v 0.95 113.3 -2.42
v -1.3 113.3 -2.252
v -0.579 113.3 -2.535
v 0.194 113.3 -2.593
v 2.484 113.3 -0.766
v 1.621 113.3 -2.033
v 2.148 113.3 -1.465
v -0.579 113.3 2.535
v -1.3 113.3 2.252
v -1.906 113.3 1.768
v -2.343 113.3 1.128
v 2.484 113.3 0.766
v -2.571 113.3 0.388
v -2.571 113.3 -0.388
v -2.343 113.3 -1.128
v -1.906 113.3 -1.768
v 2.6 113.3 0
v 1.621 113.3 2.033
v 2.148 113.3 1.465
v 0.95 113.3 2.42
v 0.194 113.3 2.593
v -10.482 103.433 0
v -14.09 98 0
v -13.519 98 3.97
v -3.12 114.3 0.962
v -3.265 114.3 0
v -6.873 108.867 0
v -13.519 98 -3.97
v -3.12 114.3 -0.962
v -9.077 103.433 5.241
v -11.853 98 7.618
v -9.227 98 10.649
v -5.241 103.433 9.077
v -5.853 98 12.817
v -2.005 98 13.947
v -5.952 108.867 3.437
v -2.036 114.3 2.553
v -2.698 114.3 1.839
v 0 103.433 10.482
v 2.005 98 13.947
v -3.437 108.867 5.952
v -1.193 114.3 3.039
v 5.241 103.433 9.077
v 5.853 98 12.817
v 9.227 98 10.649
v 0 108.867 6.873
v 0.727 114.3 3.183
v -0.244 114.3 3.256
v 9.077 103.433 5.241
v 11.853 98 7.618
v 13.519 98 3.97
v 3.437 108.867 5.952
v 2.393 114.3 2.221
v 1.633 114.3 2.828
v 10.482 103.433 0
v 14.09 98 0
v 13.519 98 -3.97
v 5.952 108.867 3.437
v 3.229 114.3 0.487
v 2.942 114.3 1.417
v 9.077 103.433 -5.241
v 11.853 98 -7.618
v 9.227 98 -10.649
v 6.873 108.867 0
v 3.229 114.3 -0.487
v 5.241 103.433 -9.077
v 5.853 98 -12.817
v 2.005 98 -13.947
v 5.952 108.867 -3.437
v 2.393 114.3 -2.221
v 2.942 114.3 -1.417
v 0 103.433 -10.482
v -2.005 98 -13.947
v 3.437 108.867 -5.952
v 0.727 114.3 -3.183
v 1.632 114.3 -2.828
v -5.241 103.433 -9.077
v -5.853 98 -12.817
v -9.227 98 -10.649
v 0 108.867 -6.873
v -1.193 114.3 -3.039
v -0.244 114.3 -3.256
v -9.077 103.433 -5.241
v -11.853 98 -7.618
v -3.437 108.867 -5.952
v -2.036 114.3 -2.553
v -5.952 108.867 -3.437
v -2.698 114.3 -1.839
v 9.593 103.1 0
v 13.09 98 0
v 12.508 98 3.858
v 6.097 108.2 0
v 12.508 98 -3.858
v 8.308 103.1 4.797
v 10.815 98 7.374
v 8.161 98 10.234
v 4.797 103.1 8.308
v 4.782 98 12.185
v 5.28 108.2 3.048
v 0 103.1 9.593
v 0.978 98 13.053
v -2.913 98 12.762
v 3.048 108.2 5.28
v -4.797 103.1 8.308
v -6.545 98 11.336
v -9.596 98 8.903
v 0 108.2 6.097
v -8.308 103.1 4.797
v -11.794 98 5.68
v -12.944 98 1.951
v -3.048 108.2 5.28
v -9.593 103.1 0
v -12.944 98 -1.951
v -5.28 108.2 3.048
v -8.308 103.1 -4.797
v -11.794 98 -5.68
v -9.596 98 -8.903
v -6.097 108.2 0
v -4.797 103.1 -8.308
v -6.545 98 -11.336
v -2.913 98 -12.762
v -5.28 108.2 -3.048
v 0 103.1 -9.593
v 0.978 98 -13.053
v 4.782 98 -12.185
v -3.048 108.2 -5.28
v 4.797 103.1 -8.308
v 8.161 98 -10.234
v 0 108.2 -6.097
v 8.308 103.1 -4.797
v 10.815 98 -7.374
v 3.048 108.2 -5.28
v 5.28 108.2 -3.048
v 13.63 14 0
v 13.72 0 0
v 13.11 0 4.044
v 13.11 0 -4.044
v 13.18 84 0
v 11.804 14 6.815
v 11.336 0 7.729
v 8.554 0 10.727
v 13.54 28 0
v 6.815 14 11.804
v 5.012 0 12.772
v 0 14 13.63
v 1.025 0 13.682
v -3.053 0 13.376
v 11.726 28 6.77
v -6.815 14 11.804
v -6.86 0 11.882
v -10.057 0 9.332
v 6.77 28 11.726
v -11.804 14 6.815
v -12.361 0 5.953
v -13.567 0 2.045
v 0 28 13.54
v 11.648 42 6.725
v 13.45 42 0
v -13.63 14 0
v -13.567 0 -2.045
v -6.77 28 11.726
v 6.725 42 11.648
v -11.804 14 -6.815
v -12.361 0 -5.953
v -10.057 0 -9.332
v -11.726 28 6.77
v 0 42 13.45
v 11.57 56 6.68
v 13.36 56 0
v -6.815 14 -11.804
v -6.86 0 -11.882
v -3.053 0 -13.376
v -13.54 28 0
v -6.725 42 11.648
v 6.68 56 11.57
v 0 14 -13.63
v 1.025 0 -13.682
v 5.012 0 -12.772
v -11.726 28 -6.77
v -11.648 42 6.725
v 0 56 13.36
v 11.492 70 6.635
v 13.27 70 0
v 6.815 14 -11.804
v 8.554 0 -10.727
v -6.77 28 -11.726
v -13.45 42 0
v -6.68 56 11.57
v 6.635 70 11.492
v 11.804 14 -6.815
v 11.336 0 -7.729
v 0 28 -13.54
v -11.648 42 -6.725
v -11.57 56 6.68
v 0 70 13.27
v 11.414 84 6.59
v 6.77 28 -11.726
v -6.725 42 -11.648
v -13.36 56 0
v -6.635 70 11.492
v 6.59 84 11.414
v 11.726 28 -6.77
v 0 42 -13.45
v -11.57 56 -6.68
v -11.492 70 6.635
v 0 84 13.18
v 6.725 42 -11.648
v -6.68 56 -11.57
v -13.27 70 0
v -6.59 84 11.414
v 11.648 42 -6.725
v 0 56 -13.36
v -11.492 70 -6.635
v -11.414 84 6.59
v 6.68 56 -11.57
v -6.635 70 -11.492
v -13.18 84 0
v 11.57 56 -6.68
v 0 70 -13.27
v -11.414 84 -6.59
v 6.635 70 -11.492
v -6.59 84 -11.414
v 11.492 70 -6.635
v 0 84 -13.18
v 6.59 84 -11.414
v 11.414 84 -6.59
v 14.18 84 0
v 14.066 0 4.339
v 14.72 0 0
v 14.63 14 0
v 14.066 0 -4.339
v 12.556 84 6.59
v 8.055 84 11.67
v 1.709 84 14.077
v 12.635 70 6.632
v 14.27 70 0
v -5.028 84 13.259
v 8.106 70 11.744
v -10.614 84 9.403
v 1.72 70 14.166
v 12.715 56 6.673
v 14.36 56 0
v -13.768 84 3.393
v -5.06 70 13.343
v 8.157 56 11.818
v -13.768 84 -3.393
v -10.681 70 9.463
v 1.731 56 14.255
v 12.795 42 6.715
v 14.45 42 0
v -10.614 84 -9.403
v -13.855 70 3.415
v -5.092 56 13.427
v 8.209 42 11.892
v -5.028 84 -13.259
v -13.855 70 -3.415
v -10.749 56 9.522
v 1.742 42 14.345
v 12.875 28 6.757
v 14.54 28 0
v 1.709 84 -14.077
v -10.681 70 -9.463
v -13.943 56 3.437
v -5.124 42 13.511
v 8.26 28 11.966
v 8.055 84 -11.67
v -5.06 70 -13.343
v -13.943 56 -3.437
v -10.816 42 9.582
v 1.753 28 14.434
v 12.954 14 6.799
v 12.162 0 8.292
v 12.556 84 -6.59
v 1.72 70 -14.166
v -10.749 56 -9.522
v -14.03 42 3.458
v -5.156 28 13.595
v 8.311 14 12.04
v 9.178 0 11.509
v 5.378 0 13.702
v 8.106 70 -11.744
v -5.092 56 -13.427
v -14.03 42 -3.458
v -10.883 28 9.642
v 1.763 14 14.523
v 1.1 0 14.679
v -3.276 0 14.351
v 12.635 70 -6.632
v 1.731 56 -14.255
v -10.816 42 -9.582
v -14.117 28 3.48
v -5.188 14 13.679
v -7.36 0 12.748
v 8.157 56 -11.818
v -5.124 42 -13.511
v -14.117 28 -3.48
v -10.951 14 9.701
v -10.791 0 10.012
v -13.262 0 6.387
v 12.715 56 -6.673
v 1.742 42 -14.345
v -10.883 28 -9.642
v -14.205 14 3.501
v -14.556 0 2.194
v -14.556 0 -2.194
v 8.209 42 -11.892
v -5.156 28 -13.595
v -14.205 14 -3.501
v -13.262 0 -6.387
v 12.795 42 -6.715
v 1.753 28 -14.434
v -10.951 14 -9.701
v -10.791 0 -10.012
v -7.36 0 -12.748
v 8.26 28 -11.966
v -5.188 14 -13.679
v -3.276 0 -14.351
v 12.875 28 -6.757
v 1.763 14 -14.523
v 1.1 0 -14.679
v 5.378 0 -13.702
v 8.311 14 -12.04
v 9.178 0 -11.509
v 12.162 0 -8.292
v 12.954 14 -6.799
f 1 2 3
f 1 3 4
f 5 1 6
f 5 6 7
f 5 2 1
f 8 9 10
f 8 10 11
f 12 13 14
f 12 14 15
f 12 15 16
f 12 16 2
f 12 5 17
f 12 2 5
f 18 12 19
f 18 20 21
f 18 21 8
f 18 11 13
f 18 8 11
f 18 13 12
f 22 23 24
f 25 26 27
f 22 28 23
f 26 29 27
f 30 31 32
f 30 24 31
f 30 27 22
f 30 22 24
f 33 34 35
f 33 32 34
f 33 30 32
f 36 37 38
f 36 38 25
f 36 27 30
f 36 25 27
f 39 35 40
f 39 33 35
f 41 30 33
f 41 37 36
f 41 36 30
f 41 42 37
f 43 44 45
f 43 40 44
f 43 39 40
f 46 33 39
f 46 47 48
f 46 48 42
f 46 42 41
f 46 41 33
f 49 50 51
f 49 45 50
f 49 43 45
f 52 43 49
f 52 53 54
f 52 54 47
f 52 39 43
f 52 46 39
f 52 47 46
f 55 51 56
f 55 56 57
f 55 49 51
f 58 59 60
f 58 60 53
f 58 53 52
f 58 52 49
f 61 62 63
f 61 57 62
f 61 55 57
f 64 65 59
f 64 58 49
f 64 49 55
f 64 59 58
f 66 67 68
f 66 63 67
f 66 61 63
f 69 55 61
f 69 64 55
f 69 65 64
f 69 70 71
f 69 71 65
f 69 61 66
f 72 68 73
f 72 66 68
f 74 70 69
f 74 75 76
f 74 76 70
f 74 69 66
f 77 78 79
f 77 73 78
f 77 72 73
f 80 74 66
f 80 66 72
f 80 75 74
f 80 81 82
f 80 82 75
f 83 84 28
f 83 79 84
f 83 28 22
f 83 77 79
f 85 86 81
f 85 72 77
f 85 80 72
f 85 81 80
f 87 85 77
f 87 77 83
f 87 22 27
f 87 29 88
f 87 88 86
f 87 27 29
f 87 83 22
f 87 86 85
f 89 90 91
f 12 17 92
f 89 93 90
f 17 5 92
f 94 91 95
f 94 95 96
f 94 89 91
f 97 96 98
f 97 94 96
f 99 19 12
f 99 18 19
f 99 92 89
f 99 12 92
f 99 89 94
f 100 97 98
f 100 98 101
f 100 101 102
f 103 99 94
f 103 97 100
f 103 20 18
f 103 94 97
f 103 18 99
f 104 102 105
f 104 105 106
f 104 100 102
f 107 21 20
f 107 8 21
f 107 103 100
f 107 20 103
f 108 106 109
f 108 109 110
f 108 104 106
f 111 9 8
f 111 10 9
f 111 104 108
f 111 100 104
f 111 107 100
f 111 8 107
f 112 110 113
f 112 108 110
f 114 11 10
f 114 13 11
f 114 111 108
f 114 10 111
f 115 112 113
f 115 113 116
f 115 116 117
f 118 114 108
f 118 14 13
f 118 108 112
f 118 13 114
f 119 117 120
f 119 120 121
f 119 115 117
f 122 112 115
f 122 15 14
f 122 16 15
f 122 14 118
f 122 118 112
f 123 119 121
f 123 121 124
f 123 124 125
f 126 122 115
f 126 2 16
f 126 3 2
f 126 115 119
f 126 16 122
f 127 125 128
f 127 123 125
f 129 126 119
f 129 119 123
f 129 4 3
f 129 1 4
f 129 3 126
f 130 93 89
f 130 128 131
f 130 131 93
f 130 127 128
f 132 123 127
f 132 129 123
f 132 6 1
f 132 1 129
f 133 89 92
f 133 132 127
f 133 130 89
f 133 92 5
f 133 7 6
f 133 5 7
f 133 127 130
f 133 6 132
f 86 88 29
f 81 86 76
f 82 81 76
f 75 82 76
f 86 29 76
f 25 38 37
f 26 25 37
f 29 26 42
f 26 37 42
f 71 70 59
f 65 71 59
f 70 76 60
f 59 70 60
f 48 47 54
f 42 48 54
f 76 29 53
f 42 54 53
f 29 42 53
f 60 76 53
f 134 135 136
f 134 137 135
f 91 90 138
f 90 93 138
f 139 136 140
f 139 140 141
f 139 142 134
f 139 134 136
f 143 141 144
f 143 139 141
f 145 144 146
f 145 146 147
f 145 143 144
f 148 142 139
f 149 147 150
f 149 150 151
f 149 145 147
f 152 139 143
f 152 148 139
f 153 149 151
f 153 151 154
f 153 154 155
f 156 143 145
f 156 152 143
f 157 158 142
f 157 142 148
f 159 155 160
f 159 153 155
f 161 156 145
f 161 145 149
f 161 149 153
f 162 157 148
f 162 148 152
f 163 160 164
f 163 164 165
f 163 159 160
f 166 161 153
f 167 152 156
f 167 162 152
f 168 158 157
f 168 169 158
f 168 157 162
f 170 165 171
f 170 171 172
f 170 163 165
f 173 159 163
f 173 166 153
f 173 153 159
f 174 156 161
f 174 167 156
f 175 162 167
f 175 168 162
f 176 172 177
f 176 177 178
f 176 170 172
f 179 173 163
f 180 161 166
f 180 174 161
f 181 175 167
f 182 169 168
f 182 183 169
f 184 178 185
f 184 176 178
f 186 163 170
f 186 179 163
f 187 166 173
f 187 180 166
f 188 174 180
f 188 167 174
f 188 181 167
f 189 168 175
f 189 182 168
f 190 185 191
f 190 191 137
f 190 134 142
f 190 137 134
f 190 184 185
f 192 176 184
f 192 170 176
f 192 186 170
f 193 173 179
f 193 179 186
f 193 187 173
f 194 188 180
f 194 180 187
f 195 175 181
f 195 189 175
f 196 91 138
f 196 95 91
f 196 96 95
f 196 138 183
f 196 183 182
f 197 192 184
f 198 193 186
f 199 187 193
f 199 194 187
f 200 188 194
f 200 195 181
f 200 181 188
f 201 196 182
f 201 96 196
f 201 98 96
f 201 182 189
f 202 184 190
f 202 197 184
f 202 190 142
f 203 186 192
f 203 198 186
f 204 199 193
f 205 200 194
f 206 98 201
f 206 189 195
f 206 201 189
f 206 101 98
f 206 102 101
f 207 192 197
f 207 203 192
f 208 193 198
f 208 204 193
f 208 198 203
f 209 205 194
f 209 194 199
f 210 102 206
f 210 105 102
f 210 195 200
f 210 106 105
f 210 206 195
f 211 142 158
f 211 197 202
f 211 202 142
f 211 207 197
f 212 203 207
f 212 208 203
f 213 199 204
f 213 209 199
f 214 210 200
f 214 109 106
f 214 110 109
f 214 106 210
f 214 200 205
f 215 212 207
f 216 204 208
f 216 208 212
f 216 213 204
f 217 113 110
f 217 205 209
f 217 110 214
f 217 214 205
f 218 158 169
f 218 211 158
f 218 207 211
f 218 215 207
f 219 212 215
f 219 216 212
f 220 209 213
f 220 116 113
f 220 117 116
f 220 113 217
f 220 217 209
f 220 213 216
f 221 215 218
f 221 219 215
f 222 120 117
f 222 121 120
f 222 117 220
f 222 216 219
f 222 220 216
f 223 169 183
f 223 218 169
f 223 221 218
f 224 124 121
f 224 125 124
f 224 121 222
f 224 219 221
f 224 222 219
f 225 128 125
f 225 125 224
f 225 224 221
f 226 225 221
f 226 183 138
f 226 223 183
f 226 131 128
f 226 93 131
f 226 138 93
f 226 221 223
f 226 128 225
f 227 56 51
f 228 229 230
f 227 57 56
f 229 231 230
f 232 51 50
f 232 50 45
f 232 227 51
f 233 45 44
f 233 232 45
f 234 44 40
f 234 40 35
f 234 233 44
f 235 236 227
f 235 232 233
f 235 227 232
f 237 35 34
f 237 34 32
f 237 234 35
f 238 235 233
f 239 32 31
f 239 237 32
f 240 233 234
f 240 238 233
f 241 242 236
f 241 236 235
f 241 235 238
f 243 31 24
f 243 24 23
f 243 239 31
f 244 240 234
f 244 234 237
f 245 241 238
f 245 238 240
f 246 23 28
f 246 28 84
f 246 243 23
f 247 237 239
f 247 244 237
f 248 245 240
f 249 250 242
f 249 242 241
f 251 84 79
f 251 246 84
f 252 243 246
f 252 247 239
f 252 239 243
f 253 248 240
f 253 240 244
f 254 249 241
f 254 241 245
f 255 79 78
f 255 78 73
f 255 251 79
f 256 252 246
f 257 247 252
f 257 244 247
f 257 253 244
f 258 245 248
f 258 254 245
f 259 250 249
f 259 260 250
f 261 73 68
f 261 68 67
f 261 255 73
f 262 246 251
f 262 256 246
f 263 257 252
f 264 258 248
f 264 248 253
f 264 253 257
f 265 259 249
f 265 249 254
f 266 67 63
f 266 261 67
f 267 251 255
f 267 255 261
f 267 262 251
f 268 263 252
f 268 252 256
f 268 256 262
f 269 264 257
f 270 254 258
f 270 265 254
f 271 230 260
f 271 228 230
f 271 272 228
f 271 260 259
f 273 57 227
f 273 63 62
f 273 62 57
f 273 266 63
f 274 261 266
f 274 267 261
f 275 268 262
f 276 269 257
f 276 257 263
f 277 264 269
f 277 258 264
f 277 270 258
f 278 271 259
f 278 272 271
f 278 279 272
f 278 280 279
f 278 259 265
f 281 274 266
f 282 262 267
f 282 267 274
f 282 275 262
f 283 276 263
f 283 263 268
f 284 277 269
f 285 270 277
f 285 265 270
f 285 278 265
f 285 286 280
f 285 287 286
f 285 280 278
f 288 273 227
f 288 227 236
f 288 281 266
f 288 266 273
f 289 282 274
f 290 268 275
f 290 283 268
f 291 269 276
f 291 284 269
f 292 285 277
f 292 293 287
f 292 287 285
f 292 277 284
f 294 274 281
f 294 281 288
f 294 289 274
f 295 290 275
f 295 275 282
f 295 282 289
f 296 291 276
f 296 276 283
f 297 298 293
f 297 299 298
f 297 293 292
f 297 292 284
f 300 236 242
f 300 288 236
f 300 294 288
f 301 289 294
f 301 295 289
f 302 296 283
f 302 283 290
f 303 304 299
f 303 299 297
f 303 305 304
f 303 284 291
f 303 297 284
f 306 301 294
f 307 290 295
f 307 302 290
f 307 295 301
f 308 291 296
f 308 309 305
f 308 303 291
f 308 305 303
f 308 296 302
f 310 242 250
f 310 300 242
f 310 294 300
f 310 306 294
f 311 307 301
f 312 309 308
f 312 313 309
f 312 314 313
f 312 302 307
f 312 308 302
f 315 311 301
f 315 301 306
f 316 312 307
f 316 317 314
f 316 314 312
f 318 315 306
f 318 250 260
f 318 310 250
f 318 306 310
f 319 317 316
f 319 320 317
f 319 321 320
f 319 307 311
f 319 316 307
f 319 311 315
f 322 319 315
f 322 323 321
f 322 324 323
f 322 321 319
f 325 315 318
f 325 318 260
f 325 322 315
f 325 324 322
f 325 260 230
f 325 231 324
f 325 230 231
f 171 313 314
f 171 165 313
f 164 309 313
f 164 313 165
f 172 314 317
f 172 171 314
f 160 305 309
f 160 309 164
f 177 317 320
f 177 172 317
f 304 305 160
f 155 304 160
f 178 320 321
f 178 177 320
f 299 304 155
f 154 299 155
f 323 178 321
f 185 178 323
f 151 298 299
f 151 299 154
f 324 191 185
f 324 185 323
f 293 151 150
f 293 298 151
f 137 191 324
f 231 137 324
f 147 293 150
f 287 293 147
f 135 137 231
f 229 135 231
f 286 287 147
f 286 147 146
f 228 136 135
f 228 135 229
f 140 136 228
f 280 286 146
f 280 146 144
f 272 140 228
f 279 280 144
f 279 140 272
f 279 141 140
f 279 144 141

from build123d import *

# Parameters (mm, degrees)
F2_R       = 14.09
F0_R       = 14.72
F3_FACE_R  = 14.09
F7_R       = 3.265
F4_R       = 13.72
F5_R       = 13.09
F10_FACE_R = 13.09
F11_R      = 2.6


with BuildPart() as f3:
    # F2 (on offset) → F3 section 0
    with BuildSketch(Plane.XZ.offset(-98)):
        Circle(F2_R)
    # F0 (on Front) → F3 section 1
    with BuildSketch(Plane.XZ):
        Circle(F0_R)
    loft()

    # F3_face (on face) → F9 section 0
    with BuildSketch(Plane(origin=(0, 98, 0), x_dir=(-1, 0, 0), z_dir=(0, 1, 0))):
        Circle(F3_FACE_R)
    # F7 (on offset) → F9 section 1
    with BuildSketch(Plane.XZ.offset(-114.3)):
        Circle(F7_R)
    loft()

    # F4 (on Front) → F10 section 0
    with BuildSketch(Plane.XZ):
        Circle(F4_R)
    # F5 (on offset) → F10 section 1
    with BuildSketch(Plane.XZ.offset(-98)):
        Circle(F5_R)
    loft(mode=Mode.SUBTRACT)

    # F10_face (on face) → F12 section 0
    with BuildSketch(Plane.XZ.offset(-98)):
        Circle(F10_FACE_R)
    # F11 (on offset) → F12 section 1
    with BuildSketch(Plane.XZ.offset(-113.3)):
        Circle(F11_R)
    loft(mode=Mode.SUBTRACT)


solid = f3.part
